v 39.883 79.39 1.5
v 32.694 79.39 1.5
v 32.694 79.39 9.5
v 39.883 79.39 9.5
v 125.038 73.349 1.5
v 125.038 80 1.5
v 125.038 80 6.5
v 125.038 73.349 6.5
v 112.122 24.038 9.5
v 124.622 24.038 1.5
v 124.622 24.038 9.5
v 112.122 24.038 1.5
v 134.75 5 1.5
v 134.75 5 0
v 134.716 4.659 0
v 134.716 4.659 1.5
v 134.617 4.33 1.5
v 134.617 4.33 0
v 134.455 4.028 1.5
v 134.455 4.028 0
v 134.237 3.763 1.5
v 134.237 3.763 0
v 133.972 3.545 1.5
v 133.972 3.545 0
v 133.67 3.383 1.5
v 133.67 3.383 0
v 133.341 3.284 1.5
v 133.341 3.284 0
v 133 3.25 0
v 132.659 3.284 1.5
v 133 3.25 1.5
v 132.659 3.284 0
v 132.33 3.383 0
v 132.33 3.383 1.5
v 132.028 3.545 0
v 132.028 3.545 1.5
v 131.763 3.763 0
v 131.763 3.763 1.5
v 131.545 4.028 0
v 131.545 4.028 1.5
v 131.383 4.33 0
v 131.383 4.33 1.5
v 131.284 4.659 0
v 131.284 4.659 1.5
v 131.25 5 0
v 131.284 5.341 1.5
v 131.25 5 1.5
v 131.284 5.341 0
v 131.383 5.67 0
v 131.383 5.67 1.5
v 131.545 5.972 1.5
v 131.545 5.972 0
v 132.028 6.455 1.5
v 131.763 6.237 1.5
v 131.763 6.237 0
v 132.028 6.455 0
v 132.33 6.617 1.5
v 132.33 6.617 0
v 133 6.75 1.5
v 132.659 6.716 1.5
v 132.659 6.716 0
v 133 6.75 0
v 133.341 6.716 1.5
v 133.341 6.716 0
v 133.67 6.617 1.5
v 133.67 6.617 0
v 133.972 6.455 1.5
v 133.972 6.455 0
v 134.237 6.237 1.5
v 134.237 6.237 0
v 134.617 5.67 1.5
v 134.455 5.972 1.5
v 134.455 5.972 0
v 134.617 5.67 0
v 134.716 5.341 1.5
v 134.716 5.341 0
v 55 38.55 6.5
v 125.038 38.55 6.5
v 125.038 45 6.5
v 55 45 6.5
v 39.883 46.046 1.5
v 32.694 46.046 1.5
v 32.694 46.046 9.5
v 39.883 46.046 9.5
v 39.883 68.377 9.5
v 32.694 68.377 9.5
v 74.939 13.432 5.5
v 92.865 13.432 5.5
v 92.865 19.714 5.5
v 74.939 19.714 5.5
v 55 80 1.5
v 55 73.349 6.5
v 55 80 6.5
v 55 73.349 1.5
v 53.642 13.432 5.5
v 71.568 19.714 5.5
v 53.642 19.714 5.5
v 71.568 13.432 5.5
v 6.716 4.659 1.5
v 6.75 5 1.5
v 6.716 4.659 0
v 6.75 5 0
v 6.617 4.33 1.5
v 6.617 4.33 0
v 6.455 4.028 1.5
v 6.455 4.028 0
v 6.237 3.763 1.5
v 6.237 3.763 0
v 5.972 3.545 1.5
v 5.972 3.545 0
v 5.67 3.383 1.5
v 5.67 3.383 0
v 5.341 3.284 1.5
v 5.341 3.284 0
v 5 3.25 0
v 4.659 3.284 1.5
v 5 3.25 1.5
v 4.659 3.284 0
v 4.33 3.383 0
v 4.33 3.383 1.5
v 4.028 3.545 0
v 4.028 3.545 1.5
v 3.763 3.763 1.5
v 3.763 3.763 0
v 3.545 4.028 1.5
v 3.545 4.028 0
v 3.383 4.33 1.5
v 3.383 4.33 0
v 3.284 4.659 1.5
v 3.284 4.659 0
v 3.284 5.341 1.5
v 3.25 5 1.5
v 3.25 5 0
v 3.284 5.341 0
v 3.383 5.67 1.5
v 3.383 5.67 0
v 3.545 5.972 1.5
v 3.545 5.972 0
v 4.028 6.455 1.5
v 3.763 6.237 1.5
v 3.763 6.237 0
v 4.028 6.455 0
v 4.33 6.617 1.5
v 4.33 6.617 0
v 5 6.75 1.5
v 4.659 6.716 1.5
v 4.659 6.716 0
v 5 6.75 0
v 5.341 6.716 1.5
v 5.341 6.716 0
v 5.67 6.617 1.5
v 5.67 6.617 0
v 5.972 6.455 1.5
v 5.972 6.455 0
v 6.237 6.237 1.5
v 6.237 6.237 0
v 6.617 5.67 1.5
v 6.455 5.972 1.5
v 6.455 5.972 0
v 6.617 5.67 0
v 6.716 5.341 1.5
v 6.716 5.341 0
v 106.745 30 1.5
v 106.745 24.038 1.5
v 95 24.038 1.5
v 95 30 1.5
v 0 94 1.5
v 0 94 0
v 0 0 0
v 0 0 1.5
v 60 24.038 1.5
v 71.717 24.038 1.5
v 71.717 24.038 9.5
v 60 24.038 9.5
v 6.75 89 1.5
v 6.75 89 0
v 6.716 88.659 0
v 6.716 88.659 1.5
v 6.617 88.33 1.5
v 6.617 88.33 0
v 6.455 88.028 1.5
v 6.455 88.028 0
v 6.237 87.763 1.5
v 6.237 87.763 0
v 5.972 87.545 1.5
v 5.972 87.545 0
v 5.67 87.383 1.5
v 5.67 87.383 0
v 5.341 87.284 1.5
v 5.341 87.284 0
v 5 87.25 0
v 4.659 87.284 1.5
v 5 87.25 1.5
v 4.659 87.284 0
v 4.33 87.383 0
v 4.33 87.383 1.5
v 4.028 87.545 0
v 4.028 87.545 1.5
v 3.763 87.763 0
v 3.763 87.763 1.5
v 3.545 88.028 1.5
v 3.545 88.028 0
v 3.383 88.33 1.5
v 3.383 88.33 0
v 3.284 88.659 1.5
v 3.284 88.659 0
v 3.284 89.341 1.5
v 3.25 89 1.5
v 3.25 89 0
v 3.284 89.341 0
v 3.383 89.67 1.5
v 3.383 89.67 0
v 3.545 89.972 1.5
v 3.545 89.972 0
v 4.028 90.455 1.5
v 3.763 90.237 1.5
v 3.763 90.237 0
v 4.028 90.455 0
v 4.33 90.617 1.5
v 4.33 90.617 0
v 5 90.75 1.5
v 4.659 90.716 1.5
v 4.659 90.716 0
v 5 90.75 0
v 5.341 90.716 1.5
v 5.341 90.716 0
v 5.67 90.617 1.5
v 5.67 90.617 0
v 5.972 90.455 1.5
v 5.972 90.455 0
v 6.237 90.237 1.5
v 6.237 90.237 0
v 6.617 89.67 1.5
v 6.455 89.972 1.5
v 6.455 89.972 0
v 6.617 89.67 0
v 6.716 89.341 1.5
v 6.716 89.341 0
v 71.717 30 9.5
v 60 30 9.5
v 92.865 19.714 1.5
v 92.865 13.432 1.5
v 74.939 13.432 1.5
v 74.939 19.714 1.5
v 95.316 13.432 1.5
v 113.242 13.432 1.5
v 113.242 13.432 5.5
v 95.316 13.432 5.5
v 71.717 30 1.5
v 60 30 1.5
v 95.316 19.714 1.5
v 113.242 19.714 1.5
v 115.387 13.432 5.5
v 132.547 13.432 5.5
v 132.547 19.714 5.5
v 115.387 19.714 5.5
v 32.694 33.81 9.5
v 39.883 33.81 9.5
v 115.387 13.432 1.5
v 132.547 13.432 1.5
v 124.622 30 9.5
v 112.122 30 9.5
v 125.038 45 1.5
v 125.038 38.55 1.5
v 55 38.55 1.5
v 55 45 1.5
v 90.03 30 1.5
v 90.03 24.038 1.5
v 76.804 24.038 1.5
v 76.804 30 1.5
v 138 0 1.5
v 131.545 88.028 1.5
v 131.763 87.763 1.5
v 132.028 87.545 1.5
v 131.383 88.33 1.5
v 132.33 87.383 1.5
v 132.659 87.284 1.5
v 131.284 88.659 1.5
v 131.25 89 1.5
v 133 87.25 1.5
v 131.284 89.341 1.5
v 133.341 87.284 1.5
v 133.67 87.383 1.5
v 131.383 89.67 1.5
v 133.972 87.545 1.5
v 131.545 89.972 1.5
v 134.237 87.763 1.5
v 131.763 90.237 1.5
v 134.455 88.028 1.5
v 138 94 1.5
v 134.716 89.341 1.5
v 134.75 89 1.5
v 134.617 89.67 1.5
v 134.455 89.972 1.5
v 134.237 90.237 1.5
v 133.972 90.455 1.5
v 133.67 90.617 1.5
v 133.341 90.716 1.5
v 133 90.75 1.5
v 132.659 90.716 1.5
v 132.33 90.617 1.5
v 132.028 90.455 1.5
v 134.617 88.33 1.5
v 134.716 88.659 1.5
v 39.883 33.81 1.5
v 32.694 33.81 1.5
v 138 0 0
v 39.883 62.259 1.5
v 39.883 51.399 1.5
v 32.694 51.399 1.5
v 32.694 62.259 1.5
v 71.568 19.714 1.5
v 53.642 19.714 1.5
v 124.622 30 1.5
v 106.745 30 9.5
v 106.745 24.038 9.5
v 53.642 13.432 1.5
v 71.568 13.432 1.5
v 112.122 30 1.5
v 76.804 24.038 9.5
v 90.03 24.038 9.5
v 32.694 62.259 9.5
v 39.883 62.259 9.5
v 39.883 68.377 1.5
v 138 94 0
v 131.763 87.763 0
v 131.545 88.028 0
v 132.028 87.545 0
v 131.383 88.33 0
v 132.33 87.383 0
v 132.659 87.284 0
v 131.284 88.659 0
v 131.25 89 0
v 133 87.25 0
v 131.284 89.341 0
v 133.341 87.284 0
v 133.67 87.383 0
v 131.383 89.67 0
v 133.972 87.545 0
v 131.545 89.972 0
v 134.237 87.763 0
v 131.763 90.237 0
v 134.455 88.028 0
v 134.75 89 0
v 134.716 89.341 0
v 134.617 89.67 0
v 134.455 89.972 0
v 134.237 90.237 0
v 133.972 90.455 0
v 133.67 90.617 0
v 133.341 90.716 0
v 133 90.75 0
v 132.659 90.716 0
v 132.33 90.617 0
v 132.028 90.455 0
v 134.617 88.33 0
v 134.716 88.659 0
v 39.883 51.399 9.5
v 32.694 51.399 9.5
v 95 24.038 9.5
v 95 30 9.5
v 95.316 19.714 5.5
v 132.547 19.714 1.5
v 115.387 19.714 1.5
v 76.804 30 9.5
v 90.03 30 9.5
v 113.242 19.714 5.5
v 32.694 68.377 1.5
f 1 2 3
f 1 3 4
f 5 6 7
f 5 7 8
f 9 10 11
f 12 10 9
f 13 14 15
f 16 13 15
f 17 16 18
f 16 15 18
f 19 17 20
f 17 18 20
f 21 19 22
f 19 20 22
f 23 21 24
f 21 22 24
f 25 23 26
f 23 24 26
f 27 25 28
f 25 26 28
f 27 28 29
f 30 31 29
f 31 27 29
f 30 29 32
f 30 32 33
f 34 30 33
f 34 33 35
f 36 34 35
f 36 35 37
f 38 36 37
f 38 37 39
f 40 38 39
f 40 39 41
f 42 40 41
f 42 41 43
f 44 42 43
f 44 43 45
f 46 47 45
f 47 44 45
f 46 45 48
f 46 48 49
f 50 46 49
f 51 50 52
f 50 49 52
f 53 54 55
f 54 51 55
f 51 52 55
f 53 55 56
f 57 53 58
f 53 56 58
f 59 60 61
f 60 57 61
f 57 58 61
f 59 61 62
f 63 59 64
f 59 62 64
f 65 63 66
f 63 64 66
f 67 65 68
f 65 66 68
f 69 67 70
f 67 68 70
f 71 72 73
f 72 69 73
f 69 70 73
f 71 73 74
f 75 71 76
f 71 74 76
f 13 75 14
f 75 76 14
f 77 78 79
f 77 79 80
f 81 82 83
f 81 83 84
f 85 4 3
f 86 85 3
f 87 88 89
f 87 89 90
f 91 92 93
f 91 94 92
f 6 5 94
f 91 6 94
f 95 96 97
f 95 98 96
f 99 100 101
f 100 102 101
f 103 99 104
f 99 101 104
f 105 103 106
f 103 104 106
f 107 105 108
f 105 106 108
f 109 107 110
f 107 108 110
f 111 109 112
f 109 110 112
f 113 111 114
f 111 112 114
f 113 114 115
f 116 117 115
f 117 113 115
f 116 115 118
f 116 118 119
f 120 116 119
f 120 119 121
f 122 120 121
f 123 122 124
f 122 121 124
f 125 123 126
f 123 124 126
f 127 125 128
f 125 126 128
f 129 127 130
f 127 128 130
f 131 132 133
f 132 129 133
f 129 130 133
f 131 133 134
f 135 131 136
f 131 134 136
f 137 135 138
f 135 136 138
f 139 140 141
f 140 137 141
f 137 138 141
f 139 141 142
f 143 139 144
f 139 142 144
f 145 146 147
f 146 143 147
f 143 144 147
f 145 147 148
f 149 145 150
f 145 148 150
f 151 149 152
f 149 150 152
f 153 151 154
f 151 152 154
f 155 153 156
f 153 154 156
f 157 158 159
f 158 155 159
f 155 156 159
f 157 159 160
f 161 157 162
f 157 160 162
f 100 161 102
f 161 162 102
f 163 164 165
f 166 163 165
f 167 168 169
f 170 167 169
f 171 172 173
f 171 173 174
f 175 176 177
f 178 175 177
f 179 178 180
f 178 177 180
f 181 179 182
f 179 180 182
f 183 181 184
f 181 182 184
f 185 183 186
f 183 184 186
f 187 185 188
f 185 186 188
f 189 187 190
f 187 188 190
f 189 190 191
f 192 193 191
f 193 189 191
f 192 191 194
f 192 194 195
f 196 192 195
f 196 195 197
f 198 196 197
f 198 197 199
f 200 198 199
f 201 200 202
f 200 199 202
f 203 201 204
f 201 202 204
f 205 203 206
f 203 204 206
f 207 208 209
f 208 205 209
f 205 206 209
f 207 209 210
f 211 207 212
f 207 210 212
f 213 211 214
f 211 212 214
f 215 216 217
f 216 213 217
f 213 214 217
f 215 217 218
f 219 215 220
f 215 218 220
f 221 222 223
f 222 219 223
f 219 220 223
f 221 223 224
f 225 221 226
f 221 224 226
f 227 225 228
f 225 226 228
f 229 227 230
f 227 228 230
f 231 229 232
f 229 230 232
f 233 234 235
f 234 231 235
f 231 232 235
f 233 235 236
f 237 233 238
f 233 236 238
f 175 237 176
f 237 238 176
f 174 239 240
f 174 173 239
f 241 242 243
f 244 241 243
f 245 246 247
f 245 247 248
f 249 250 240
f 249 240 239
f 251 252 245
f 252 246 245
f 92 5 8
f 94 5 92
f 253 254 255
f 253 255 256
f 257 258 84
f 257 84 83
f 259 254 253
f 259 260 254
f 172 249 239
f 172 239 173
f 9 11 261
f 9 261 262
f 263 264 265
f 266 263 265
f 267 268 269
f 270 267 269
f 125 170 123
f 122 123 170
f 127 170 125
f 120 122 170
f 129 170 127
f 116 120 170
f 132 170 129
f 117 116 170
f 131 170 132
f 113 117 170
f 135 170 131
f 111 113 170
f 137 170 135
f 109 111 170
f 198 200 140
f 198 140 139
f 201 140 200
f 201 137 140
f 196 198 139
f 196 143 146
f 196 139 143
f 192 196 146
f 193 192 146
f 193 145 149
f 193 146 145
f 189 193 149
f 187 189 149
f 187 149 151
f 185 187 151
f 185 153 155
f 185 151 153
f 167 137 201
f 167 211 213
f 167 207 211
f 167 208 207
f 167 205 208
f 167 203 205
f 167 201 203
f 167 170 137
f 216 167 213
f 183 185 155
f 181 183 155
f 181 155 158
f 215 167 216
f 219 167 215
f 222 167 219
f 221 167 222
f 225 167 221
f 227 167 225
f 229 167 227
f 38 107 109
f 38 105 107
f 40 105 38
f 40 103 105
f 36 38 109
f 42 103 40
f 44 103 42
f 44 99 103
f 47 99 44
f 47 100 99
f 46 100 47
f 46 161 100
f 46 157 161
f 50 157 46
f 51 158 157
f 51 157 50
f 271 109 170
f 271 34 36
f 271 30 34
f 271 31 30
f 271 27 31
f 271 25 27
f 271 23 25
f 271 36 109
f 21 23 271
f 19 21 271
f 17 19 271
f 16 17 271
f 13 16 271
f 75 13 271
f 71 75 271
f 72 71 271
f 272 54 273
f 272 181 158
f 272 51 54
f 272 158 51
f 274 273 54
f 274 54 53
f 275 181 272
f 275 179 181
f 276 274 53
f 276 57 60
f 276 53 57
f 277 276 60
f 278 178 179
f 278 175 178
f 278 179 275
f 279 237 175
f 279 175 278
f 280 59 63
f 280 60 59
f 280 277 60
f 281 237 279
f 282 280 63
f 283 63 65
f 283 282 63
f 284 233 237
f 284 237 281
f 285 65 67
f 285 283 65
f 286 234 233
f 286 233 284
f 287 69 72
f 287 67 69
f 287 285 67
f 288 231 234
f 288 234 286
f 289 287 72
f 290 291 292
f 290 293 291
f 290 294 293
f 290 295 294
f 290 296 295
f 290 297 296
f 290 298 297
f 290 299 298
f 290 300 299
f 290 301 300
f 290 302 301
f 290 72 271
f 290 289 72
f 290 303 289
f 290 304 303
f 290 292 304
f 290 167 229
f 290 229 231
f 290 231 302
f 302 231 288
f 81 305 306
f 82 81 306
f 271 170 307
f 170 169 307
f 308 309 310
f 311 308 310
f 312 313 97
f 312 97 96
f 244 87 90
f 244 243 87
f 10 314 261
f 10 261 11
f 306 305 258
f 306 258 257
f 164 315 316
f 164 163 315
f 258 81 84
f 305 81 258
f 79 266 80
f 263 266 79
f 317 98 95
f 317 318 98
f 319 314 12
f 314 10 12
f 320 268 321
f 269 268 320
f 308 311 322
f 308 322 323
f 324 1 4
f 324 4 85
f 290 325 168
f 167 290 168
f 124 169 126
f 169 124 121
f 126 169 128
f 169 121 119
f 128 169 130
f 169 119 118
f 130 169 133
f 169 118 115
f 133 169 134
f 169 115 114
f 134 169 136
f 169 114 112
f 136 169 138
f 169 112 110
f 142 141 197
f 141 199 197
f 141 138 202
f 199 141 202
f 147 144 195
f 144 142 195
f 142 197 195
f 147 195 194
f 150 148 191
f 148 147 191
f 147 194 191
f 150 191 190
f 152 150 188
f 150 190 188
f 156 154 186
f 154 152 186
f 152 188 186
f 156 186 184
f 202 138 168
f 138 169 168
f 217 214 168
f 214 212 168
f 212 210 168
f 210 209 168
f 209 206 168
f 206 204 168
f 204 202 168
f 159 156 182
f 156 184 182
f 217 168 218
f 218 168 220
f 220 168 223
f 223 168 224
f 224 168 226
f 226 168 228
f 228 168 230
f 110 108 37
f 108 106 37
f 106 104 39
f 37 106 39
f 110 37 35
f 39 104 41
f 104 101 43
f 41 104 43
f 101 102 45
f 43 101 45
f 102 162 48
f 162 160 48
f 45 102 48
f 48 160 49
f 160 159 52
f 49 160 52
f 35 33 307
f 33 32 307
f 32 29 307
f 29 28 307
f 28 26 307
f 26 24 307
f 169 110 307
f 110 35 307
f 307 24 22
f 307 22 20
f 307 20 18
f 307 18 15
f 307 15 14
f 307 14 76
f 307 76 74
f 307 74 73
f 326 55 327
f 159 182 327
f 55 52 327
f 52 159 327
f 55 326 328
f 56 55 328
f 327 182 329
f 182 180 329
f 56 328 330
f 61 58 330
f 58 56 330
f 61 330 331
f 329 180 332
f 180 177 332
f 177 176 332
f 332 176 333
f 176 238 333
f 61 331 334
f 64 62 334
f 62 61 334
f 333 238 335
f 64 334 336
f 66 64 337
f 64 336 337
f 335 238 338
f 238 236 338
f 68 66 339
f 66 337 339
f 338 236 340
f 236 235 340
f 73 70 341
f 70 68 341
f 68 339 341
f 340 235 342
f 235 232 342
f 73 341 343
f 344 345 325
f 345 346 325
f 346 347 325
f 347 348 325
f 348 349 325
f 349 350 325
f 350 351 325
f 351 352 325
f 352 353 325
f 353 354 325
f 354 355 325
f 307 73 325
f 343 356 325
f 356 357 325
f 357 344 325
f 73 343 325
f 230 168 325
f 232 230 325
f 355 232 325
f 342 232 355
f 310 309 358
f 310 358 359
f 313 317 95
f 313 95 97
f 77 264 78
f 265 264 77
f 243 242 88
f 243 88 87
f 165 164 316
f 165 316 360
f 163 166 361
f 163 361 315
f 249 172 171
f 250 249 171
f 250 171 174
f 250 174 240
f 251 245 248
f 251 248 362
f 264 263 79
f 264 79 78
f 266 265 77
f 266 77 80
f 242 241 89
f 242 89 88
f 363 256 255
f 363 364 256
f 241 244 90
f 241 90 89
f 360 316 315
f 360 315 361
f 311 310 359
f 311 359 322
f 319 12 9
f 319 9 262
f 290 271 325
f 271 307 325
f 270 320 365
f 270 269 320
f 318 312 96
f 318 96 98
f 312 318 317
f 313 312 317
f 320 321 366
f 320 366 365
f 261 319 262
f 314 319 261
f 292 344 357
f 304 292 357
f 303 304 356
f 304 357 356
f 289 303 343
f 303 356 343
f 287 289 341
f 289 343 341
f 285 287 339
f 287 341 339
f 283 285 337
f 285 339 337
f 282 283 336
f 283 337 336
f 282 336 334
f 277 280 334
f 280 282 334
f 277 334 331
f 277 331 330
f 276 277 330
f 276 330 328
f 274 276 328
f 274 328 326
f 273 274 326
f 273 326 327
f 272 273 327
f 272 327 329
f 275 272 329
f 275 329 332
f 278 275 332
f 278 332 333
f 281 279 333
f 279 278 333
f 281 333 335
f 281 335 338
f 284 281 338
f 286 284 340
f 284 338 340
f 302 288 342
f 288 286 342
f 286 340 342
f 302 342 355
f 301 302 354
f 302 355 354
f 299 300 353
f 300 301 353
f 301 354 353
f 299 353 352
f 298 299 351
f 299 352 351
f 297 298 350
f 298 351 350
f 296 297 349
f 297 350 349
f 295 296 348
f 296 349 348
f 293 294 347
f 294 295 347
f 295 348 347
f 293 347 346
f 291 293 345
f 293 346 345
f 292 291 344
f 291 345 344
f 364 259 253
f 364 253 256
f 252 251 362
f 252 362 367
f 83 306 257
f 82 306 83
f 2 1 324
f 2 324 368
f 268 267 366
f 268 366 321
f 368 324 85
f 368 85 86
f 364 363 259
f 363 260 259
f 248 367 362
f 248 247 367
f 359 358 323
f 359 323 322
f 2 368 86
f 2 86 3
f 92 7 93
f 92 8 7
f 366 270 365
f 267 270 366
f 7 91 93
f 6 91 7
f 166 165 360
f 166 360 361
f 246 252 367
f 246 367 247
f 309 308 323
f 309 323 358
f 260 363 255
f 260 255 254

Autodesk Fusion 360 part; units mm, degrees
sketch "草图1" plane through (0, 0, 0) normal (0, 0, 1) x (1, 0, 0)
  line L0 (0, 0) -> (138, 0)
  line L1 (138, 0) -> (138, 94)
  line L2 (138, 94) -> (0, 94)
  line L3 (0, 94) -> (0, 0)
  line L4 (-20, 47) -> (170, 47)
  line L5 (69, 129.1488) -> (69, -36.2993)
  circle A0 centre (5, 89) radius 1.75
  circle A1 centre (133, 89) radius 1.75
  circle A2 centre (5, 5) radius 1.75
  circle A3 centre (133, 5) radius 1.75
  dimension "d1" = 94
  dimension "d2" = 138
  dimension "d3" = 84
  dimension "d4" = 128
  dimension "d5" = 3.5
extrude "拉伸1" add sketch "草图1" along normal blind 1.5 makes body 1
sketch "草图2" plane through (0, 0, 1.5) normal (0, 0, 1) x (-1, 0, 0)
  circle A0 centre (-5, -5) radius 1.75
  circle A1 centre (-133, -89) radius 1.75
  circle A2 centre (-133, -5) radius 1.75
  circle A3 centre (-5, -89) radius 1.75
  line L0 (0, -94) -> (0, 0)
  line L1 (0, 0) -> (-138, 0)
  line L2 (-138, 0) -> (-138, -94)
  line L3 (-138, -94) -> (0, -94)
  line L4 (-55, -80) -> (-125.0378, -80)
  line L5 (-125.0378, -80) -> (-125.0378, -73.349)
  line L6 (-125.0378, -73.349) -> (-55, -73.349)
  line L7 (-55, -73.349) -> (-55, -80)
  line L8 (-55, -45) -> (-125.0378, -45)
  line L9 (-125.0378, -45) -> (-125.0378, -38.5504)
  line L10 (-125.0378, -38.5504) -> (-55, -38.5504)
  line L11 (-55, -38.5504) -> (-55, -45)
extrude "拉伸2" add sketch "草图2" along normal blind 5 separate body contours L4 L5 L6 L7 | L8 L9 L10 L11 makes body 2 at (101.6919, 75.566, 1.5) makes body 3 at (78.3459, 42.8501, 1.5)
sketch "草图3" plane through (0, 0, 1.5) normal (0, 0, 1) x (-1, 0, 0)
  circle A0 centre (-5, -5) radius 1.75
  circle A1 centre (-133, -89) radius 1.75
  circle A2 centre (-133, -5) radius 1.75
  circle A3 centre (-5, -89) radius 1.75
  line L0 (0, -94) -> (0, 0)
  line L1 (0, 0) -> (-138, 0)
  line L2 (-138, 0) -> (-138, -94)
  line L3 (-138, -94) -> (0, -94)
  line L4 (-60, -30) -> (-71.7172, -30)
  line L5 (-71.7172, -30) -> (-71.7172, -24.0385)
  line L6 (-71.7172, -24.0385) -> (-60, -24.0385)
  line L7 (-60, -24.0385) -> (-60, -30)
  line L8 (-76.8041, -30) -> (-90.0303, -30)
  line L9 (-90.0303, -30) -> (-90.0303, -24.0385)
  line L10 (-90.0303, -24.0385) -> (-76.8041, -24.0385)
  line L11 (-76.8041, -24.0385) -> (-76.8041, -30)
  line L12 (-95, -30) -> (-106.7446, -30)
  line L13 (-106.7446, -30) -> (-106.7446, -24.0385)
  line L14 (-106.7446, -24.0385) -> (-95, -24.0385)
  line L15 (-95, -24.0385) -> (-95, -30)
  line L16 (-112.1223, -30) -> (-124.6217, -30)
  line L17 (-124.6217, -30) -> (-124.6217, -24.0385)
  line L18 (-124.6217, -24.0385) -> (-112.1223, -24.0385)
  line L19 (-112.1223, -24.0385) -> (-112.1223, -30)
extrude "拉伸3" add sketch "草图3" along normal blind 8 separate body contours L4 L5 L6 L7 | L8 L9 L10 L11 | L12 L13 L14 L15 | L16 L17 L18 L19 makes body 4 at (98.9149, 30, 4.1667) makes body 5 at (81.2129, 30, 4.1667) makes body 6 at (116.2887, 30, 6.8333) makes body 7 at (63.9057, 30, 4.1667)
sketch "草图4" plane through (0, 0, 1.5) normal (0, 0, 1) x (-1, 0, 0)
  circle A0 centre (-5, -5) radius 1.75
  circle A1 centre (-133, -89) radius 1.75
  circle A2 centre (-133, -5) radius 1.75
  circle A3 centre (-5, -89) radius 1.75
  line L0 (0, -94) -> (0, 0)
  line L1 (0, 0) -> (-138, 0)
  line L2 (-138, 0) -> (-138, -94)
  line L3 (-138, -94) -> (0, -94)
  line L4 (-53.6424, -19.7138) -> (-71.5683, -19.7138)
  line L5 (-71.5683, -19.7138) -> (-71.5683, -13.4321)
  line L6 (-71.5683, -13.4321) -> (-53.6424, -13.4321)
  line L7 (-53.6424, -13.4321) -> (-53.6424, -19.7138)
  line L8 (-74.9389, -19.7138) -> (-92.8648, -19.7138)
  line L9 (-92.8648, -19.7138) -> (-92.8648, -13.4321)
  line L10 (-92.8648, -13.4321) -> (-74.9389, -13.4321)
  line L11 (-74.9389, -13.4321) -> (-74.9389, -19.7138)
  line L12 (-95.3162, -19.7138) -> (-113.2421, -19.7138)
  line L13 (-113.2421, -19.7138) -> (-113.2421, -13.4321)
  line L14 (-113.2421, -13.4321) -> (-95.3162, -13.4321)
  line L15 (-95.3162, -13.4321) -> (-95.3162, -19.7138)
  line L16 (-115.387, -19.7138) -> (-132.5468, -19.7138)
  line L17 (-132.5468, -19.7138) -> (-132.5468, -13.4321)
  line L18 (-132.5468, -13.4321) -> (-115.387, -13.4321)
  line L19 (-115.387, -13.4321) -> (-115.387, -19.7138)
extrude "拉伸4" add sketch "草图4" along normal blind 4 separate body contours L4 L5 L6 L7 | L8 L9 L10 L11 | L12 L13 L14 L15 | L16 L17 L18 L19 makes body 8 at (101.2915, 15.526, 1.5) makes body 9 at (86.8895, 17.6199, 1.5) makes body 10 at (121.107, 15.526, 1.5) makes body 11 at (59.6177, 15.526, 1.5)
sketch "草图5" plane through (0, 0, 1.5) normal (0, 0, 1) x (-1, 0, 0)
  circle A0 centre (-5, -5) radius 1.75
  circle A1 centre (-133, -89) radius 1.75
  circle A2 centre (-133, -5) radius 1.75
  circle A3 centre (-5, -89) radius 1.75
  line L0 (0, -94) -> (0, 0)
  line L1 (0, 0) -> (-138, 0)
  line L2 (-138, 0) -> (-138, -94)
  line L3 (-138, -94) -> (0, -94)
  line L4 (-32.6944, -79.3897) -> (-39.8832, -79.3897)
  line L5 (-39.8832, -79.3897) -> (-39.8832, -68.3771)
  line L6 (-39.8832, -68.3771) -> (-32.6944, -68.3771)
  line L7 (-32.6944, -68.3771) -> (-32.6944, -79.3897)
  line L8 (-32.6944, -62.2589) -> (-39.8832, -62.2589)
  line L9 (-39.8832, -62.2589) -> (-39.8832, -51.3992)
  line L10 (-39.8832, -51.3992) -> (-32.6944, -51.3992)
  line L11 (-32.6944, -51.3992) -> (-32.6944, -62.2589)
  line L12 (-32.6944, -46.0458) -> (-39.8832, -46.0458)
  line L13 (-39.8832, -46.0458) -> (-39.8832, -33.8095)
  line L14 (-39.8832, -33.8095) -> (-32.6944, -33.8095)
  line L15 (-32.6944, -33.8095) -> (-32.6944, -46.0458)
extrude "拉伸5" add sketch "草图5" along normal blind 8 separate body contours L4 L5 L6 L7 | L8 L9 L10 L11 | L12 L13 L14 L15 makes body 12 at (32.6944, 37.8883, 6.8333) makes body 13 at (39.8832, 58.639, 4.1667) makes body 14 at (39.8832, 75.7189, 4.1667)
copy_body "实体->零部件1" bodies 1 removing the originals makes body 15 in component "Component"
copy_body "实体->零部件2" bodies 2 removing the originals makes body 16 in component "Component'"
copy_body "实体->零部件3" bodies 3 removing the originals makes body 17 in component "Component''"
copy_body "实体->零部件4" bodies 4 removing the originals makes body 18 in component "Component'''"
copy_body "实体->零部件5" bodies 5 removing the originals makes body 19 in component "Component''''"
copy_body "实体->零部件6" bodies 6 removing the originals makes body 20 in component "Component'''''"
copy_body "实体->零部件7" bodies 7 removing the originals makes body 21 in component "Component''''''"
copy_body "实体->零部件8" bodies 8 removing the originals makes body 22 in component "Component'''''''"
copy_body "实体->零部件9" bodies 9 removing the originals makes body 23 in component "Component''''''''"
copy_body "实体->零部件10" bodies 10 removing the originals makes body 24 in component "Component'''''''''"
copy_body "实体->零部件11" bodies 11 removing the originals makes body 25 in component "Component''''''''''"
copy_body "实体->零部件12" bodies 12 removing the originals makes body 26 in component "Component'''''''''''"
copy_body "实体->零部件13" bodies 13 removing the originals makes body 27 in component "Component''''''''''''"
copy_body "实体->零部件14" bodies 14 removing the originals makes body 28 in component "Component'''''''''''''"
component "Component" placed x (1, 0, 0) y (0, 1, 0) z (0, 0, 1) at (0, 0, 0)
component "Component'" placed x (1, 0, 0) y (0, 1, 0) z (0, 0, 1) at (0, 0, 0)
component "Component''" placed x (1, 0, 0) y (0, 1, 0) z (0, 0, 1) at (0, 0, 0)
component "Component'''" placed x (1, 0, 0) y (0, 1, 0) z (0, 0, 1) at (0, 0, 0)
component "Component''''" placed x (1, 0, 0) y (0, 1, 0) z (0, 0, 1) at (0, 0, 0)
component "Component'''''" placed x (1, 0, 0) y (0, 1, 0) z (0, 0, 1) at (0, 0, 0)
component "Component''''''" placed x (1, 0, 0) y (0, 1, 0) z (0, 0, 1) at (0, 0, 0)
component "Component'''''''" placed x (1, 0, 0) y (0, 1, 0) z (0, 0, 1) at (0, 0, 0)
component "Component''''''''" placed x (1, 0, 0) y (0, 1, 0) z (0, 0, 1) at (0, 0, 0)
component "Component'''''''''" placed x (1, 0, 0) y (0, 1, 0) z (0, 0, 1) at (0, 0, 0)
component "Component''''''''''" placed x (1, 0, 0) y (0, 1, 0) z (0, 0, 1) at (0, 0, 0)
component "Component'''''''''''" placed x (1, 0, 0) y (0, 1, 0) z (0, 0, 1) at (0, 0, 0)
component "Component''''''''''''" placed x (1, 0, 0) y (0, 1, 0) z (0, 0, 1) at (0, 0, 0)
component "Component'''''''''''''" placed x (1, 0, 0) y (0, 1, 0) z (0, 0, 1) at (0, 0, 0)
